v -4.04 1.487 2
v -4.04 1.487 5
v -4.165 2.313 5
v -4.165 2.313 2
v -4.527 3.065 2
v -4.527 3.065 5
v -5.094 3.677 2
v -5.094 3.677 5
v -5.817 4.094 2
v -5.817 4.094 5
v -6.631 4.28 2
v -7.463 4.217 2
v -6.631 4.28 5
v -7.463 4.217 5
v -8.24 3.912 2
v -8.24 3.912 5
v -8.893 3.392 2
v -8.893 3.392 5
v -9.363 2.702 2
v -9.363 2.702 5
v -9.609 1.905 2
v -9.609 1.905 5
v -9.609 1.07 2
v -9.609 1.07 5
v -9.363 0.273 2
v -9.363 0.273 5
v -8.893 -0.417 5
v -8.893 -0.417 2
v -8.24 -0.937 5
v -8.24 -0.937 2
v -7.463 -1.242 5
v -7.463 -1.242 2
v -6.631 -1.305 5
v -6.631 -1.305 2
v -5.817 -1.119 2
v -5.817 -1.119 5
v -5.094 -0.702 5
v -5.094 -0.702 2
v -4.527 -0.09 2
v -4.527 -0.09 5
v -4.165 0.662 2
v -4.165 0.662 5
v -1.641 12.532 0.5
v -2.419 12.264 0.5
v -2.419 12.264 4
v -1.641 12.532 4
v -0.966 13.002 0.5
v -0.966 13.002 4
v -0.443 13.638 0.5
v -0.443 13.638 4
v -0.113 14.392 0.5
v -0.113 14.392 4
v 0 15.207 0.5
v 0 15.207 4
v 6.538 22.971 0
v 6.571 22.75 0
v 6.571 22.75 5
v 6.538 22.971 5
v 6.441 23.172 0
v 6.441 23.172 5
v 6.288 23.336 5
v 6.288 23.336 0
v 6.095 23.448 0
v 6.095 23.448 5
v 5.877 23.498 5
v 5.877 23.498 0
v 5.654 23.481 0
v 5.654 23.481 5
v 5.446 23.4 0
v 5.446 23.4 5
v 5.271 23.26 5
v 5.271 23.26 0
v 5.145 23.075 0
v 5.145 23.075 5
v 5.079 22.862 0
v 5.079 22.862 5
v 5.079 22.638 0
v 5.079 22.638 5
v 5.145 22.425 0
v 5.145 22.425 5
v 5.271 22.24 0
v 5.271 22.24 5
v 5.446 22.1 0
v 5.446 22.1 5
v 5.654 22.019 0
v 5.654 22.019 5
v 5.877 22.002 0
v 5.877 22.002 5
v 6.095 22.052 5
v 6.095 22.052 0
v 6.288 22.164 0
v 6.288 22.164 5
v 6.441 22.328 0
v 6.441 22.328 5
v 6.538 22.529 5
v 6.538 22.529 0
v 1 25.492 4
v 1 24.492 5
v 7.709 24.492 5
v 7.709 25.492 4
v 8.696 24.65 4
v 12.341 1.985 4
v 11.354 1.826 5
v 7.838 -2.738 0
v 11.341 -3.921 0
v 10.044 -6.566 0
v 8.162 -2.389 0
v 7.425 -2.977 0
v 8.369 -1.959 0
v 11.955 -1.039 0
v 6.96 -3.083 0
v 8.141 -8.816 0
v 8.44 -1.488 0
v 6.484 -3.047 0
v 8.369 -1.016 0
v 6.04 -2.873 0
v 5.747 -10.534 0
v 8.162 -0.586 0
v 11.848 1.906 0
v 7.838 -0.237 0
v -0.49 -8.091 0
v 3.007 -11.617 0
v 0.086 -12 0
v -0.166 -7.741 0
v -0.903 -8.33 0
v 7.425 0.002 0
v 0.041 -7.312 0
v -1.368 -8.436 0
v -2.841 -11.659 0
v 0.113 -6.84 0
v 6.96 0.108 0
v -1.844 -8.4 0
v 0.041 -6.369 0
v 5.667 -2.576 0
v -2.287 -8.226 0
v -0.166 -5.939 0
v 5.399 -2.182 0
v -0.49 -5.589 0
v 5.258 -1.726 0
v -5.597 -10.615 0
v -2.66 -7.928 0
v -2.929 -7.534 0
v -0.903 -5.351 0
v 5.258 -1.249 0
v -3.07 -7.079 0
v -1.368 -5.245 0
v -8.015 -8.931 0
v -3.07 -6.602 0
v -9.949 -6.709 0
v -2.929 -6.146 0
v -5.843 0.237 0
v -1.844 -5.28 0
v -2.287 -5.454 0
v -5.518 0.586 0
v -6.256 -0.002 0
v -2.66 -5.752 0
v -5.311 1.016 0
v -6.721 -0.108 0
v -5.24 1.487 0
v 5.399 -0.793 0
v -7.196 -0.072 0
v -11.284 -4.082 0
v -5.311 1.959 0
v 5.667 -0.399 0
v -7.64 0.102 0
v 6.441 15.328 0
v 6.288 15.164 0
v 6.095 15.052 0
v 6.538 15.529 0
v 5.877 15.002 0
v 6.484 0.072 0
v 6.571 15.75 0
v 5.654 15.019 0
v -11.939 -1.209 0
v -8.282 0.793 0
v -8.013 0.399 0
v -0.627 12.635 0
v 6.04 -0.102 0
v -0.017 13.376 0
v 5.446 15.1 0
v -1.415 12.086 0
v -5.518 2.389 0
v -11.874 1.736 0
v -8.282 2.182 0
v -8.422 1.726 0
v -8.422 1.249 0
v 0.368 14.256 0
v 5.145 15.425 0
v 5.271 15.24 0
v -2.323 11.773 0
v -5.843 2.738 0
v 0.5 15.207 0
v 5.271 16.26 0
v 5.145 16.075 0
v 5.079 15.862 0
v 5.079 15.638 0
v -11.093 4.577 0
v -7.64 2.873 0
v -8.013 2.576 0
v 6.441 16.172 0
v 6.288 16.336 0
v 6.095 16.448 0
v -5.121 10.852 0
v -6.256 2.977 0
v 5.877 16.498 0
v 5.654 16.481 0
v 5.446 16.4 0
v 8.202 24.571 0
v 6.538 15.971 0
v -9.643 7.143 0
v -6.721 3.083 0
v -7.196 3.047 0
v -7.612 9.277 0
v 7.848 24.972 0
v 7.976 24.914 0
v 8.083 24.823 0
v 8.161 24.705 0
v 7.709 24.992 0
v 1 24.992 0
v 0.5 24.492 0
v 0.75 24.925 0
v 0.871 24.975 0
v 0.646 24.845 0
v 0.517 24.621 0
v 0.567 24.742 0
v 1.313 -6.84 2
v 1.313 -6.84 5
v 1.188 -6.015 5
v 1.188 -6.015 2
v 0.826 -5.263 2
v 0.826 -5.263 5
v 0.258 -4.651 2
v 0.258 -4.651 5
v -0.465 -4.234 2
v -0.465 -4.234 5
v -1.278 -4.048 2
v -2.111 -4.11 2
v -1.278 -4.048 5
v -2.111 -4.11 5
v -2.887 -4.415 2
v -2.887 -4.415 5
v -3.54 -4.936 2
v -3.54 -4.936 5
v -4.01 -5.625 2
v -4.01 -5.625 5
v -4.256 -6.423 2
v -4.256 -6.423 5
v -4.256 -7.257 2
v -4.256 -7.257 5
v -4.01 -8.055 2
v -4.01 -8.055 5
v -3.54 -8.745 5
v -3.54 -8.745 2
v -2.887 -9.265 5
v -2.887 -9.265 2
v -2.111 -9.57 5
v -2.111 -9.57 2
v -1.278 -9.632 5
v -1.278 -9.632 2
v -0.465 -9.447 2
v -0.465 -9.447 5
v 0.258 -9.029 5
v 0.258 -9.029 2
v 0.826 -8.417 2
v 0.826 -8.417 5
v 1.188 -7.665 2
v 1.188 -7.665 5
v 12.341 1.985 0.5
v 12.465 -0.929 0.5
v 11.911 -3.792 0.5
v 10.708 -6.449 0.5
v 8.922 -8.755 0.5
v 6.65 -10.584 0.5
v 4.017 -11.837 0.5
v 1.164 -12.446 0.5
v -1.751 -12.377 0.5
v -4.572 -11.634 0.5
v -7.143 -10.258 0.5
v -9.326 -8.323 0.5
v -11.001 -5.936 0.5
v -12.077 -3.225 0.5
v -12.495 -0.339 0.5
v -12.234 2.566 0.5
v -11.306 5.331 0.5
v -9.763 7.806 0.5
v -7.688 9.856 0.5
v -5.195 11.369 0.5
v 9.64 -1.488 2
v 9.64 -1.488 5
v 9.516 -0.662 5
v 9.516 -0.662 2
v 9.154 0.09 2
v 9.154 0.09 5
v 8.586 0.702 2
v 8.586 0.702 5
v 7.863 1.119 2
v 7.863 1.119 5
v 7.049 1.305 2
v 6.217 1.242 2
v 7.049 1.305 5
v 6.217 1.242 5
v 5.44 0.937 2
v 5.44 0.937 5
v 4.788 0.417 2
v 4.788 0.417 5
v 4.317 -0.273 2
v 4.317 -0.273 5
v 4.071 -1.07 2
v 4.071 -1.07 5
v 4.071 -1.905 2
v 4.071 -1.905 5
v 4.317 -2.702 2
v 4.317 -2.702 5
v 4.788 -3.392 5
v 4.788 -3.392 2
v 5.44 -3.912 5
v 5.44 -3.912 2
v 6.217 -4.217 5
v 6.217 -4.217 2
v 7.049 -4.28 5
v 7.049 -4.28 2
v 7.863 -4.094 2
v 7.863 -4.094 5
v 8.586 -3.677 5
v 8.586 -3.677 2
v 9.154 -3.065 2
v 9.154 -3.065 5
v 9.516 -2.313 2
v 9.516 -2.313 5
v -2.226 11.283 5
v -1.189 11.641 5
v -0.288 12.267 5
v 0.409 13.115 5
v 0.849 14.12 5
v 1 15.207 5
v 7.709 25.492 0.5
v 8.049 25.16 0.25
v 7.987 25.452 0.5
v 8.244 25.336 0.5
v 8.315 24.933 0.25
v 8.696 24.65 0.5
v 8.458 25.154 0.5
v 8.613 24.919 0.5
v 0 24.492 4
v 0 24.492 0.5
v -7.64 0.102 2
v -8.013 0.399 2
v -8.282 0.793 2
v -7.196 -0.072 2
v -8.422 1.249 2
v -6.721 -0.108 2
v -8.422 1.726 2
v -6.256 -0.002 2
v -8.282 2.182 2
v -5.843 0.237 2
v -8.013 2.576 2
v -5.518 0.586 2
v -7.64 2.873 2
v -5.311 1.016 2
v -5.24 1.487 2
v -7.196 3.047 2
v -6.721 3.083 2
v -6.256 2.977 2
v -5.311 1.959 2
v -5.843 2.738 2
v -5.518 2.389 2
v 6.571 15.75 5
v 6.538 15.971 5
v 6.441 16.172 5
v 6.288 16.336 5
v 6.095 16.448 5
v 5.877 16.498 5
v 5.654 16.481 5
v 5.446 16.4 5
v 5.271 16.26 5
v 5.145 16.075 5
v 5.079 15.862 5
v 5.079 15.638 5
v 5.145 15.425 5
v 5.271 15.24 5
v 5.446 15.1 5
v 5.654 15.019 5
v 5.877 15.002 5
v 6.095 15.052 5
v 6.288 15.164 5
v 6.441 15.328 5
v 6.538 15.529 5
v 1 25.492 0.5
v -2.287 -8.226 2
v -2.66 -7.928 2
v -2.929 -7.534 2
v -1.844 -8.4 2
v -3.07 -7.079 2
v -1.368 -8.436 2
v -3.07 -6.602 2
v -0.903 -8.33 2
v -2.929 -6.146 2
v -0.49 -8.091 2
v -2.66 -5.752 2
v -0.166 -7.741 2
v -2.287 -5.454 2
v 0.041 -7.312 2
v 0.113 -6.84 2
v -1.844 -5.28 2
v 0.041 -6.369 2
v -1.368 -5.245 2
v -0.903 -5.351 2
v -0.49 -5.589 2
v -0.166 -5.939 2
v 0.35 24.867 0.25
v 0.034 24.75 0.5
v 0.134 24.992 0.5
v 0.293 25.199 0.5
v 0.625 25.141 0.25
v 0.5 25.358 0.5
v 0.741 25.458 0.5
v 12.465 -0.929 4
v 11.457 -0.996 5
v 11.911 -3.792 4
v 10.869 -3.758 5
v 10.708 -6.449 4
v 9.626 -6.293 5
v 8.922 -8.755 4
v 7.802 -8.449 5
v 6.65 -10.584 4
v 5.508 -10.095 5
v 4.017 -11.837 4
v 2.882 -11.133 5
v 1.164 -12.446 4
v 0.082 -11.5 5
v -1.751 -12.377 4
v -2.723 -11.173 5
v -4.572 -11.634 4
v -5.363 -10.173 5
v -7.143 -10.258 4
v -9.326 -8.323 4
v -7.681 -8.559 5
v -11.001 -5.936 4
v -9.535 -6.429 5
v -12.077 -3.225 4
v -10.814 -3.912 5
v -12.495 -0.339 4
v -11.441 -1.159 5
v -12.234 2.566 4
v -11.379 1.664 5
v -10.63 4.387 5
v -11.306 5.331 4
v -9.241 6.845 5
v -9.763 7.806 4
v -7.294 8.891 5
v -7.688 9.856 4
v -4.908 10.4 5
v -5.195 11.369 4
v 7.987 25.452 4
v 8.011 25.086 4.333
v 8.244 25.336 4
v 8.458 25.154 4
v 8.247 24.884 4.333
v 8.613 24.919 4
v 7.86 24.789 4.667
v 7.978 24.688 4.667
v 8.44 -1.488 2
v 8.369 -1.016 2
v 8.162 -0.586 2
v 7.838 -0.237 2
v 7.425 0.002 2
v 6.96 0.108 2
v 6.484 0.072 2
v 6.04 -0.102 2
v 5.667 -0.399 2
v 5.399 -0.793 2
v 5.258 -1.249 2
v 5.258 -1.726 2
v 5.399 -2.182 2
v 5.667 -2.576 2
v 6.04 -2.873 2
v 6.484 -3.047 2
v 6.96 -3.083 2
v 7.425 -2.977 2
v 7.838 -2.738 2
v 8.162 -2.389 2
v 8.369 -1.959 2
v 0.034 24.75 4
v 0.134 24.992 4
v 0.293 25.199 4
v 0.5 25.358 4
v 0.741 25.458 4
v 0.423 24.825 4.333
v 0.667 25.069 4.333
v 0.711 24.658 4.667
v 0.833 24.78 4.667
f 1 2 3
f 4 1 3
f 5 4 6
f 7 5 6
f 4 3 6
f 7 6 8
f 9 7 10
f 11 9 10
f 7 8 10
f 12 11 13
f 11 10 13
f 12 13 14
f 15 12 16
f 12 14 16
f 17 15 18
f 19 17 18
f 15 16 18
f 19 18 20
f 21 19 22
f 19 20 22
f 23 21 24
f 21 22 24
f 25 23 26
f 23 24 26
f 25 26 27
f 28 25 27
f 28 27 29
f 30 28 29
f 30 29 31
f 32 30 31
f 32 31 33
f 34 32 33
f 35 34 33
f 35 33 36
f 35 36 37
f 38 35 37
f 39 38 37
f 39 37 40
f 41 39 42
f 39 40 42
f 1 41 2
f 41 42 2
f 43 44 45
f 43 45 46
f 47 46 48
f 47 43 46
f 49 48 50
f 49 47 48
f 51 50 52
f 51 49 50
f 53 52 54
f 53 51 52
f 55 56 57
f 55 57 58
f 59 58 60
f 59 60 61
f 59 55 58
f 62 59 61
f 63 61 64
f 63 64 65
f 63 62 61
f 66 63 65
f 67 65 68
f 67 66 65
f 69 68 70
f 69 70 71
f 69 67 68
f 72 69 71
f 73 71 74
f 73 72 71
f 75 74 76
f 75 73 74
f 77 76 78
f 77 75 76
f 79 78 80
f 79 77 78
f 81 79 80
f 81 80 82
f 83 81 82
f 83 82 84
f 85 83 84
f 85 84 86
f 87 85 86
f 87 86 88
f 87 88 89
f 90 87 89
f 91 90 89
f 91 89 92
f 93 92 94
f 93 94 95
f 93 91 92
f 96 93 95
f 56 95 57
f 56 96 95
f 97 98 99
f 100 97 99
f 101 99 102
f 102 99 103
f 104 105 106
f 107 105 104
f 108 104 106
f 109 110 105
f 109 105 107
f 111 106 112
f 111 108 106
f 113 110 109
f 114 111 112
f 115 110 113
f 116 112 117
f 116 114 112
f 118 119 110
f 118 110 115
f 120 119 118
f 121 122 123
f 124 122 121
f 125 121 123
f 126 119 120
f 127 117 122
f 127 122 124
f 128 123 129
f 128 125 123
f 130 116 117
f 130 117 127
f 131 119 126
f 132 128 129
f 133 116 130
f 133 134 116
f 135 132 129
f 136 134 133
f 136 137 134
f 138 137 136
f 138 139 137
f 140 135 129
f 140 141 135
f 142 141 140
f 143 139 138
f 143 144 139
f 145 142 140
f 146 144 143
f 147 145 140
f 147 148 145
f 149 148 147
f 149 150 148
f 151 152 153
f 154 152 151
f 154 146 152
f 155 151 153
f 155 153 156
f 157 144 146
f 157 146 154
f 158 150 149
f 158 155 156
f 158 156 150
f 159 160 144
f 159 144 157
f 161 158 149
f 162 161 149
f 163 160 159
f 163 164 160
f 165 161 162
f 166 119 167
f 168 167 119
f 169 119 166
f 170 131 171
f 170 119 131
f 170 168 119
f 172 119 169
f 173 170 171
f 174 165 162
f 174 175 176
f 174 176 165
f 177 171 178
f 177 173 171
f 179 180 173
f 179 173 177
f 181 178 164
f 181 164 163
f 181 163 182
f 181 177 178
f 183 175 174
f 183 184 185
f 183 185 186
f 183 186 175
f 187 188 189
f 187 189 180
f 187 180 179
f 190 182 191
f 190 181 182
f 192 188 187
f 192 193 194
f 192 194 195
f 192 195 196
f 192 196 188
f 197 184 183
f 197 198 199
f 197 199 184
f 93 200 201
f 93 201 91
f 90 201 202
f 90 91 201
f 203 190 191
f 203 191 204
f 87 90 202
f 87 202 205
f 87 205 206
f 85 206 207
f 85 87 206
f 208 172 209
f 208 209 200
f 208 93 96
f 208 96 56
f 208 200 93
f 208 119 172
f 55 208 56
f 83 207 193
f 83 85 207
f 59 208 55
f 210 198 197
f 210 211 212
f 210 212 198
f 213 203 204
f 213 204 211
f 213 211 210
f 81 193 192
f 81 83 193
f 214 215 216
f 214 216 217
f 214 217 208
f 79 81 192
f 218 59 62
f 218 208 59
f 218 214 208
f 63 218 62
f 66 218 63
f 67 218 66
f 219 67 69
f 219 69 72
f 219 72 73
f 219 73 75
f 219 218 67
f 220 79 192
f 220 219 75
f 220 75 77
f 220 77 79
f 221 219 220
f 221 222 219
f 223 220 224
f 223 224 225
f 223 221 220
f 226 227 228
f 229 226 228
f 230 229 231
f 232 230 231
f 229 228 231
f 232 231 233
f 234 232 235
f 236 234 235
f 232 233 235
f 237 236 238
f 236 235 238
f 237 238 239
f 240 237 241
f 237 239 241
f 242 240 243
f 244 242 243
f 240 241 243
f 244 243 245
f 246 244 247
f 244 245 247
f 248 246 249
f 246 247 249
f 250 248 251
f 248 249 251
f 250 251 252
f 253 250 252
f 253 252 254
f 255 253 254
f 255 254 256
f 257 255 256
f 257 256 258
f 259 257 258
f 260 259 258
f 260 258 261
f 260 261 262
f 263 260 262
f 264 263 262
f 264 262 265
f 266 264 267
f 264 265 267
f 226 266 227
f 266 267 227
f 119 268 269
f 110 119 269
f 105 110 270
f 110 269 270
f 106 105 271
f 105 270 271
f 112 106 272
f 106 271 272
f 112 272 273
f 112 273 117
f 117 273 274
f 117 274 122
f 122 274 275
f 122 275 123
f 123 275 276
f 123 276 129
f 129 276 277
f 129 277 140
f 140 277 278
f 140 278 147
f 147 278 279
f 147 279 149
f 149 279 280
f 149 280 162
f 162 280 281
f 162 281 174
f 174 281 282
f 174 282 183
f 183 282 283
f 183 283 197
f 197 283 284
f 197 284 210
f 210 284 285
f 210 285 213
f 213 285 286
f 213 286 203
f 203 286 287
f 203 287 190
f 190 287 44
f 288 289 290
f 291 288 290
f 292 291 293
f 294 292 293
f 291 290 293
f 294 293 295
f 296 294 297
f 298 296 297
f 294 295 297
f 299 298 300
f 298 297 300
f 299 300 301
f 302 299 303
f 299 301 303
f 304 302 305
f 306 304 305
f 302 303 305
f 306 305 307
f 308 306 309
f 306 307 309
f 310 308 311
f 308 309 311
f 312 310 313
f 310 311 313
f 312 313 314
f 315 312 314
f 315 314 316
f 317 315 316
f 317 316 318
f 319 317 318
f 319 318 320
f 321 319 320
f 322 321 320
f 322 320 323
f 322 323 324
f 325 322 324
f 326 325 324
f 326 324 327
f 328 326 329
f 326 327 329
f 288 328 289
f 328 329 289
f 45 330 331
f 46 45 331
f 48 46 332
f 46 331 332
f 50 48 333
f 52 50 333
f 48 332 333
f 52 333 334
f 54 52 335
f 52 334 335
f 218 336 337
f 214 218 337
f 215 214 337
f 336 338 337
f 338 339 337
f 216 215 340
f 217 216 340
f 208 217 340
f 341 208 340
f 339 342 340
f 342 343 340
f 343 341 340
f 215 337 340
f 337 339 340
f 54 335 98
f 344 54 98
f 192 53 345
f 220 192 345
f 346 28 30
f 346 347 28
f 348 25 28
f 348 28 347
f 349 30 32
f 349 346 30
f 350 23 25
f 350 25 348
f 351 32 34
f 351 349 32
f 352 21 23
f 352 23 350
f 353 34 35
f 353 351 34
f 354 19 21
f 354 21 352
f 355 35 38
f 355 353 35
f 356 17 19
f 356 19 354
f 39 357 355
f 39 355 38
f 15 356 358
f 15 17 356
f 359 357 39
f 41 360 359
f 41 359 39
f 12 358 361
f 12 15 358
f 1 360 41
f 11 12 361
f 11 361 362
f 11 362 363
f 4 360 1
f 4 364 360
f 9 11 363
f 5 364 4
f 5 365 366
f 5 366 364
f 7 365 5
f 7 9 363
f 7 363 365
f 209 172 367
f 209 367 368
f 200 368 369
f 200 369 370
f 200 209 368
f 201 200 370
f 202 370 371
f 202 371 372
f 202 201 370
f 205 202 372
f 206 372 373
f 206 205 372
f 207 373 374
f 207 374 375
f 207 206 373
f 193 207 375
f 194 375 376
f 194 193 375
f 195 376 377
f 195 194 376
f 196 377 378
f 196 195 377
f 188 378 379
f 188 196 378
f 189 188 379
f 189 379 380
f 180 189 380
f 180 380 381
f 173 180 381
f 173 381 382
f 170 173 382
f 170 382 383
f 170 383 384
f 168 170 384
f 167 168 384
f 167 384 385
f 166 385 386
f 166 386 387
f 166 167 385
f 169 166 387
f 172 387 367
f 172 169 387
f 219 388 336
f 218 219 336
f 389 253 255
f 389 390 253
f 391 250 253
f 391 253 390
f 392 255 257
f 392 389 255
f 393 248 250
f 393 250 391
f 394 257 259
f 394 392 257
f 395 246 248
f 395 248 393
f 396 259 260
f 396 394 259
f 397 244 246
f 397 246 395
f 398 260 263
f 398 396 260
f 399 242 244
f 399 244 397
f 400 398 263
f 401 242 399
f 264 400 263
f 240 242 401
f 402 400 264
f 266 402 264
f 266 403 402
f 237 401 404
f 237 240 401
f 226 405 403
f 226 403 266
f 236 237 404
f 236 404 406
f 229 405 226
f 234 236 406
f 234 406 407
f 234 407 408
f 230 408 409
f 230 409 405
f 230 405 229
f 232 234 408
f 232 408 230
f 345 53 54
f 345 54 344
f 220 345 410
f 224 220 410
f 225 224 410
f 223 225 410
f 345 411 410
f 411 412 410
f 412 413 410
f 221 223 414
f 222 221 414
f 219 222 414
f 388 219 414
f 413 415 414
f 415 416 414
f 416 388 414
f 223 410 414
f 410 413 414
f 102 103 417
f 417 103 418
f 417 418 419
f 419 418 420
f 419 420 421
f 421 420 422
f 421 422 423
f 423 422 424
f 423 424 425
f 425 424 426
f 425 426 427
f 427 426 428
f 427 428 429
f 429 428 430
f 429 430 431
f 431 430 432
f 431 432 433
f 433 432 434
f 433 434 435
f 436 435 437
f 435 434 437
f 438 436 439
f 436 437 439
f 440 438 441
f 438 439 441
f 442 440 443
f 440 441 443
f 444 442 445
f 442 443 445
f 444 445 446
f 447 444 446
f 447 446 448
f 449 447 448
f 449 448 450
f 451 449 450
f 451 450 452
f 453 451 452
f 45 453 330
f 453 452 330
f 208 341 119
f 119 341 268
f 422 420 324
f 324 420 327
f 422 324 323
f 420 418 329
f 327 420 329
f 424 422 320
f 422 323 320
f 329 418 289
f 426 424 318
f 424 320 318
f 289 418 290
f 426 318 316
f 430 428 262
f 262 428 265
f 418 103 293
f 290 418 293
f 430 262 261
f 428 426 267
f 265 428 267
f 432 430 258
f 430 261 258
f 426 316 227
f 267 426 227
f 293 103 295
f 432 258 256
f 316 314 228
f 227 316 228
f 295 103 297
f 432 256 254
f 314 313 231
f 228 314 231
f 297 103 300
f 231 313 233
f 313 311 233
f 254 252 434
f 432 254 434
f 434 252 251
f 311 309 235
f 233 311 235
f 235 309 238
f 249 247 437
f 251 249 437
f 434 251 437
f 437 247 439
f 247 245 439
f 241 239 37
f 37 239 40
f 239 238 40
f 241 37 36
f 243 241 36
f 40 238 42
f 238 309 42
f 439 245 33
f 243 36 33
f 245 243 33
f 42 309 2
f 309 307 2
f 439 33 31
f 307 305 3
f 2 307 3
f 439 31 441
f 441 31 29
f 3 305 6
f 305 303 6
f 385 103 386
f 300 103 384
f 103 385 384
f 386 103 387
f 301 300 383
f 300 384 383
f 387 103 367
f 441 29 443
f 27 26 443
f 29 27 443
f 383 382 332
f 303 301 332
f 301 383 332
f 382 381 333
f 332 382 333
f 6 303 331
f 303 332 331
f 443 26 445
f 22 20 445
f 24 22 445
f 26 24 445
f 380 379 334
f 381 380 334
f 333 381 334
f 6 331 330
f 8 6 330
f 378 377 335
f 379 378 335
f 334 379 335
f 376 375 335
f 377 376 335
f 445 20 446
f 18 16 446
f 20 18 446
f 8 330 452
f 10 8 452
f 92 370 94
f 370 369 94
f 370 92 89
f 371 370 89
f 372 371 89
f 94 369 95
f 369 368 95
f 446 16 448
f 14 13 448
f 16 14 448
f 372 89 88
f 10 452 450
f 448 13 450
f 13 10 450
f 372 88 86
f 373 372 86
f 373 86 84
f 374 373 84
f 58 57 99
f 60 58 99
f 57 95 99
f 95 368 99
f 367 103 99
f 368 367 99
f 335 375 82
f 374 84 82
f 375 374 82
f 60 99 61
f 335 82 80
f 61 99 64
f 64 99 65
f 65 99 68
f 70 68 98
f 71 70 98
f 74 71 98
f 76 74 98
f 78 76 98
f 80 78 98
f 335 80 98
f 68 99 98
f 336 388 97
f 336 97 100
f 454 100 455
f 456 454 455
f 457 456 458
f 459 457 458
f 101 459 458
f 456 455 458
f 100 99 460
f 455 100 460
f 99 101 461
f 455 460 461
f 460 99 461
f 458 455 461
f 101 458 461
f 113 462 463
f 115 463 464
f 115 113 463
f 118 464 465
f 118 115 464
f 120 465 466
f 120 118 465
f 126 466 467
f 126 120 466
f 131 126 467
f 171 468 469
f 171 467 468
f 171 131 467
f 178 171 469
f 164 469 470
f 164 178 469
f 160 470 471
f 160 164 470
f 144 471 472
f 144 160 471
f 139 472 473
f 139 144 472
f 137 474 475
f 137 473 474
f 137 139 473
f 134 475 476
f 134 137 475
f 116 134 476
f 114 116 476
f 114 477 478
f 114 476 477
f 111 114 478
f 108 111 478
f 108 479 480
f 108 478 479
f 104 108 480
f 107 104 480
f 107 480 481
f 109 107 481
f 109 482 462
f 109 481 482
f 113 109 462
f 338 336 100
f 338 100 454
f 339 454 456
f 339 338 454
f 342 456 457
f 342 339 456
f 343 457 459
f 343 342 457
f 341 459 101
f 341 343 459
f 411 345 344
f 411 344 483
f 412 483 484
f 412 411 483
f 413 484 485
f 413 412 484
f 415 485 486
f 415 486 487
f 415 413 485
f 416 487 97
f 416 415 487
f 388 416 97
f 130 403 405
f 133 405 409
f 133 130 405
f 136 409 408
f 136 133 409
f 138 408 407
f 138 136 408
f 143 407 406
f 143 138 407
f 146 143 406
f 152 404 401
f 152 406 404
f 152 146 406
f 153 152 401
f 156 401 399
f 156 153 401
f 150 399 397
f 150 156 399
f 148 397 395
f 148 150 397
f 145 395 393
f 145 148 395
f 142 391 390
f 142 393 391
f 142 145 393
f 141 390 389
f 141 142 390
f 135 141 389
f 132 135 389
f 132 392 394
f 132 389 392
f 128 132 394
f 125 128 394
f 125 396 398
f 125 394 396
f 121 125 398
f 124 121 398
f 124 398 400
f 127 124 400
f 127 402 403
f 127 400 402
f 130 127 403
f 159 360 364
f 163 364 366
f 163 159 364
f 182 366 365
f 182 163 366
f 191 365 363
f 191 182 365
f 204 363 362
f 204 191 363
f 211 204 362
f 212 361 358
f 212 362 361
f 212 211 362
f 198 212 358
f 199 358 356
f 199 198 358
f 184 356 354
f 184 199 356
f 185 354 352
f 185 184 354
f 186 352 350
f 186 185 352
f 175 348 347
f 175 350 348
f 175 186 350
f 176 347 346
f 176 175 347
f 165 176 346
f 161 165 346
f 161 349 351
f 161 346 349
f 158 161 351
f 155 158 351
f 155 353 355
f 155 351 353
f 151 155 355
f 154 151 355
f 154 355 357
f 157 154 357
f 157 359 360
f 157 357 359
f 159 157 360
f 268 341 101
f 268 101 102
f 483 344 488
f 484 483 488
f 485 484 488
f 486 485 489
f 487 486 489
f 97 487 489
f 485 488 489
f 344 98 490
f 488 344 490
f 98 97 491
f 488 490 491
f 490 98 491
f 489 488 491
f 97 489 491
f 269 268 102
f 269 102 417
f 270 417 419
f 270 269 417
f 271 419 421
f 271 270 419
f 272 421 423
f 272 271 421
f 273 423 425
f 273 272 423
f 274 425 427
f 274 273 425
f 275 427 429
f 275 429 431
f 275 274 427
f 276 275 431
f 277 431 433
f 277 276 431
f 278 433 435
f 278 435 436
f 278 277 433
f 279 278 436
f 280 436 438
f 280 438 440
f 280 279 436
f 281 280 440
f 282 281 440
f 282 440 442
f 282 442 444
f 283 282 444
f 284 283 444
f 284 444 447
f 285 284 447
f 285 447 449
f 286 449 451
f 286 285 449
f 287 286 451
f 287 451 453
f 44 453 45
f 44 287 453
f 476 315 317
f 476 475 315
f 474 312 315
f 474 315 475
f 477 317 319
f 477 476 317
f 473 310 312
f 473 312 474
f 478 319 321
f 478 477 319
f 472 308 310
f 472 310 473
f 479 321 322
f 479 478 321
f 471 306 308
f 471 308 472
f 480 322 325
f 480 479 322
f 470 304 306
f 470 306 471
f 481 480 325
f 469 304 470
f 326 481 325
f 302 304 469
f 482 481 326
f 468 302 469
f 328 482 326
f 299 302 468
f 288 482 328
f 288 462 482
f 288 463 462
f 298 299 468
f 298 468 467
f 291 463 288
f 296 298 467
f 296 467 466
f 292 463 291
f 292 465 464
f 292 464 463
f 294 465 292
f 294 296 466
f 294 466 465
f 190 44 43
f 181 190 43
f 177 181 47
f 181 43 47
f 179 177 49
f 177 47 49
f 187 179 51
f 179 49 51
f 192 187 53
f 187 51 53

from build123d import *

# Parameters (mm, degrees)
SKETCH1_R           = 1.6
SKETCH1_R_2         = 1.6000000000000016
SKETCH1_R_3         = 0.7500000000000004
BOSS_EXTRUDE1_DEPTH = 5
CHAMFER1_SIZE       = 1
SKETCH2_R           = 2.8000000000000003
SKETCH2_R_2         = 2.8
CUT_EXTRUDE1_DEPTH  = 3
CHAMFER3_SIZE       = 0.5


with BuildPart() as part:
    # Sketch1 → Boss-Extrude1 (new body)
    with BuildSketch(Plane.XY):
        with BuildLine():
            Line((1.000000000000007, 25.491602871293395), (7.708608571885691, 25.491602871293395))
            ThreePointArc((7.708608571885691, 25.491602871293395), (8.357146361630761, 25.2527853298883), (8.695919750465407, 24.650400341838562))
            Line((8.695919750465407, 24.650400341838562), (12.341389732124407, 1.9849683817950852))
            ThreePointArc((12.341389732124407, 1.9849683817950852), (-7.1431391219536895, -10.257951232157744), (-2.41935483870505, 12.263634133540775))
            ThreePointArc((-2.41935483870505, 12.263634133540775), (-0.6824651584188808, 13.301904420618609), (-1e-17, 15.206906325619645))
            Line((-1e-17, 15.206906325619645), (-3e-17, 24.491602871293384))
            ThreePointArc((-3e-17, 24.491602871293384), (0.2928932188134522, 25.198709652479938), (1.000000000000007, 25.491602871293395))
        make_face()
        with Locations((-6.84012746585444, 1.4874999998823886)):
            Circle(SKETCH1_R, mode=Mode.SUBTRACT)
        with Locations((-1.487499999936831, -6.840127466035101)):
            Circle(SKETCH1_R, mode=Mode.SUBTRACT)
        with Locations((6.840127465980755, -1.4875000001175058)):
            Circle(SKETCH1_R_2, mode=Mode.SUBTRACT)
        with Locations((5.820860522174176, 15.749999999999972)):
            Circle(SKETCH1_R_3, mode=Mode.SUBTRACT)
        with Locations((5.820860522174148, 22.74999999999998)):
            Circle(SKETCH1_R_3, mode=Mode.SUBTRACT)
    extrude(amount=BOSS_EXTRUDE1_DEPTH)

    # Chamfer1
    chamfer1_edges = [part.edges().sort_by_distance(p)[0] for p in [
        (-0.6824651584188803, 13.301904420618609, 5),
        (-7.143139121953682, -10.25795123215775, 5),
        (10.518654741294906, 13.317684361816823, 5),
        (8.357146361630761, 25.2527853298883, 5),
        (4.354304285942849, 25.491602871293395, 5),
        (0.2928932188134533, 25.198709652479938, 5),
        (-2e-17, 19.849254598456515, 5),
    ]]
    chamfer(chamfer1_edges, length=CHAMFER1_SIZE)

    # Sketch2 → Cut-Extrude1 (cut)
    with BuildSketch(Plane.XY.offset(5)):
        with Locations((-6.84012746585444, 1.4874999998823886)):
            Circle(SKETCH2_R)
        with Locations((-1.487499999936831, -6.840127466035101)):
            Circle(SKETCH2_R_2)
        with Locations((6.840127465980755, -1.4875000001175058)):
            Circle(SKETCH2_R)
    extrude(amount=-CUT_EXTRUDE1_DEPTH, mode=Mode.SUBTRACT)

    # Chamfer3
    chamfer3_edges = [part.edges().sort_by_distance(p)[0] for p in [
        (-2e-17, 19.849254598456515, 0),
        (0.2928932188134533, 25.198709652479938, 0),
        (4.354304285942849, 25.491602871293395, 0),
        (8.357146361630761, 25.2527853298883, 0),
        (10.518654741294906, 13.317684361816823, 0),
        (-7.143139121953682, -10.25795123215775, 0),
        (-0.6824651584188803, 13.301904420618609, 0),
    ]]
    chamfer(chamfer3_edges, length=CHAMFER3_SIZE)


solid = part.part
